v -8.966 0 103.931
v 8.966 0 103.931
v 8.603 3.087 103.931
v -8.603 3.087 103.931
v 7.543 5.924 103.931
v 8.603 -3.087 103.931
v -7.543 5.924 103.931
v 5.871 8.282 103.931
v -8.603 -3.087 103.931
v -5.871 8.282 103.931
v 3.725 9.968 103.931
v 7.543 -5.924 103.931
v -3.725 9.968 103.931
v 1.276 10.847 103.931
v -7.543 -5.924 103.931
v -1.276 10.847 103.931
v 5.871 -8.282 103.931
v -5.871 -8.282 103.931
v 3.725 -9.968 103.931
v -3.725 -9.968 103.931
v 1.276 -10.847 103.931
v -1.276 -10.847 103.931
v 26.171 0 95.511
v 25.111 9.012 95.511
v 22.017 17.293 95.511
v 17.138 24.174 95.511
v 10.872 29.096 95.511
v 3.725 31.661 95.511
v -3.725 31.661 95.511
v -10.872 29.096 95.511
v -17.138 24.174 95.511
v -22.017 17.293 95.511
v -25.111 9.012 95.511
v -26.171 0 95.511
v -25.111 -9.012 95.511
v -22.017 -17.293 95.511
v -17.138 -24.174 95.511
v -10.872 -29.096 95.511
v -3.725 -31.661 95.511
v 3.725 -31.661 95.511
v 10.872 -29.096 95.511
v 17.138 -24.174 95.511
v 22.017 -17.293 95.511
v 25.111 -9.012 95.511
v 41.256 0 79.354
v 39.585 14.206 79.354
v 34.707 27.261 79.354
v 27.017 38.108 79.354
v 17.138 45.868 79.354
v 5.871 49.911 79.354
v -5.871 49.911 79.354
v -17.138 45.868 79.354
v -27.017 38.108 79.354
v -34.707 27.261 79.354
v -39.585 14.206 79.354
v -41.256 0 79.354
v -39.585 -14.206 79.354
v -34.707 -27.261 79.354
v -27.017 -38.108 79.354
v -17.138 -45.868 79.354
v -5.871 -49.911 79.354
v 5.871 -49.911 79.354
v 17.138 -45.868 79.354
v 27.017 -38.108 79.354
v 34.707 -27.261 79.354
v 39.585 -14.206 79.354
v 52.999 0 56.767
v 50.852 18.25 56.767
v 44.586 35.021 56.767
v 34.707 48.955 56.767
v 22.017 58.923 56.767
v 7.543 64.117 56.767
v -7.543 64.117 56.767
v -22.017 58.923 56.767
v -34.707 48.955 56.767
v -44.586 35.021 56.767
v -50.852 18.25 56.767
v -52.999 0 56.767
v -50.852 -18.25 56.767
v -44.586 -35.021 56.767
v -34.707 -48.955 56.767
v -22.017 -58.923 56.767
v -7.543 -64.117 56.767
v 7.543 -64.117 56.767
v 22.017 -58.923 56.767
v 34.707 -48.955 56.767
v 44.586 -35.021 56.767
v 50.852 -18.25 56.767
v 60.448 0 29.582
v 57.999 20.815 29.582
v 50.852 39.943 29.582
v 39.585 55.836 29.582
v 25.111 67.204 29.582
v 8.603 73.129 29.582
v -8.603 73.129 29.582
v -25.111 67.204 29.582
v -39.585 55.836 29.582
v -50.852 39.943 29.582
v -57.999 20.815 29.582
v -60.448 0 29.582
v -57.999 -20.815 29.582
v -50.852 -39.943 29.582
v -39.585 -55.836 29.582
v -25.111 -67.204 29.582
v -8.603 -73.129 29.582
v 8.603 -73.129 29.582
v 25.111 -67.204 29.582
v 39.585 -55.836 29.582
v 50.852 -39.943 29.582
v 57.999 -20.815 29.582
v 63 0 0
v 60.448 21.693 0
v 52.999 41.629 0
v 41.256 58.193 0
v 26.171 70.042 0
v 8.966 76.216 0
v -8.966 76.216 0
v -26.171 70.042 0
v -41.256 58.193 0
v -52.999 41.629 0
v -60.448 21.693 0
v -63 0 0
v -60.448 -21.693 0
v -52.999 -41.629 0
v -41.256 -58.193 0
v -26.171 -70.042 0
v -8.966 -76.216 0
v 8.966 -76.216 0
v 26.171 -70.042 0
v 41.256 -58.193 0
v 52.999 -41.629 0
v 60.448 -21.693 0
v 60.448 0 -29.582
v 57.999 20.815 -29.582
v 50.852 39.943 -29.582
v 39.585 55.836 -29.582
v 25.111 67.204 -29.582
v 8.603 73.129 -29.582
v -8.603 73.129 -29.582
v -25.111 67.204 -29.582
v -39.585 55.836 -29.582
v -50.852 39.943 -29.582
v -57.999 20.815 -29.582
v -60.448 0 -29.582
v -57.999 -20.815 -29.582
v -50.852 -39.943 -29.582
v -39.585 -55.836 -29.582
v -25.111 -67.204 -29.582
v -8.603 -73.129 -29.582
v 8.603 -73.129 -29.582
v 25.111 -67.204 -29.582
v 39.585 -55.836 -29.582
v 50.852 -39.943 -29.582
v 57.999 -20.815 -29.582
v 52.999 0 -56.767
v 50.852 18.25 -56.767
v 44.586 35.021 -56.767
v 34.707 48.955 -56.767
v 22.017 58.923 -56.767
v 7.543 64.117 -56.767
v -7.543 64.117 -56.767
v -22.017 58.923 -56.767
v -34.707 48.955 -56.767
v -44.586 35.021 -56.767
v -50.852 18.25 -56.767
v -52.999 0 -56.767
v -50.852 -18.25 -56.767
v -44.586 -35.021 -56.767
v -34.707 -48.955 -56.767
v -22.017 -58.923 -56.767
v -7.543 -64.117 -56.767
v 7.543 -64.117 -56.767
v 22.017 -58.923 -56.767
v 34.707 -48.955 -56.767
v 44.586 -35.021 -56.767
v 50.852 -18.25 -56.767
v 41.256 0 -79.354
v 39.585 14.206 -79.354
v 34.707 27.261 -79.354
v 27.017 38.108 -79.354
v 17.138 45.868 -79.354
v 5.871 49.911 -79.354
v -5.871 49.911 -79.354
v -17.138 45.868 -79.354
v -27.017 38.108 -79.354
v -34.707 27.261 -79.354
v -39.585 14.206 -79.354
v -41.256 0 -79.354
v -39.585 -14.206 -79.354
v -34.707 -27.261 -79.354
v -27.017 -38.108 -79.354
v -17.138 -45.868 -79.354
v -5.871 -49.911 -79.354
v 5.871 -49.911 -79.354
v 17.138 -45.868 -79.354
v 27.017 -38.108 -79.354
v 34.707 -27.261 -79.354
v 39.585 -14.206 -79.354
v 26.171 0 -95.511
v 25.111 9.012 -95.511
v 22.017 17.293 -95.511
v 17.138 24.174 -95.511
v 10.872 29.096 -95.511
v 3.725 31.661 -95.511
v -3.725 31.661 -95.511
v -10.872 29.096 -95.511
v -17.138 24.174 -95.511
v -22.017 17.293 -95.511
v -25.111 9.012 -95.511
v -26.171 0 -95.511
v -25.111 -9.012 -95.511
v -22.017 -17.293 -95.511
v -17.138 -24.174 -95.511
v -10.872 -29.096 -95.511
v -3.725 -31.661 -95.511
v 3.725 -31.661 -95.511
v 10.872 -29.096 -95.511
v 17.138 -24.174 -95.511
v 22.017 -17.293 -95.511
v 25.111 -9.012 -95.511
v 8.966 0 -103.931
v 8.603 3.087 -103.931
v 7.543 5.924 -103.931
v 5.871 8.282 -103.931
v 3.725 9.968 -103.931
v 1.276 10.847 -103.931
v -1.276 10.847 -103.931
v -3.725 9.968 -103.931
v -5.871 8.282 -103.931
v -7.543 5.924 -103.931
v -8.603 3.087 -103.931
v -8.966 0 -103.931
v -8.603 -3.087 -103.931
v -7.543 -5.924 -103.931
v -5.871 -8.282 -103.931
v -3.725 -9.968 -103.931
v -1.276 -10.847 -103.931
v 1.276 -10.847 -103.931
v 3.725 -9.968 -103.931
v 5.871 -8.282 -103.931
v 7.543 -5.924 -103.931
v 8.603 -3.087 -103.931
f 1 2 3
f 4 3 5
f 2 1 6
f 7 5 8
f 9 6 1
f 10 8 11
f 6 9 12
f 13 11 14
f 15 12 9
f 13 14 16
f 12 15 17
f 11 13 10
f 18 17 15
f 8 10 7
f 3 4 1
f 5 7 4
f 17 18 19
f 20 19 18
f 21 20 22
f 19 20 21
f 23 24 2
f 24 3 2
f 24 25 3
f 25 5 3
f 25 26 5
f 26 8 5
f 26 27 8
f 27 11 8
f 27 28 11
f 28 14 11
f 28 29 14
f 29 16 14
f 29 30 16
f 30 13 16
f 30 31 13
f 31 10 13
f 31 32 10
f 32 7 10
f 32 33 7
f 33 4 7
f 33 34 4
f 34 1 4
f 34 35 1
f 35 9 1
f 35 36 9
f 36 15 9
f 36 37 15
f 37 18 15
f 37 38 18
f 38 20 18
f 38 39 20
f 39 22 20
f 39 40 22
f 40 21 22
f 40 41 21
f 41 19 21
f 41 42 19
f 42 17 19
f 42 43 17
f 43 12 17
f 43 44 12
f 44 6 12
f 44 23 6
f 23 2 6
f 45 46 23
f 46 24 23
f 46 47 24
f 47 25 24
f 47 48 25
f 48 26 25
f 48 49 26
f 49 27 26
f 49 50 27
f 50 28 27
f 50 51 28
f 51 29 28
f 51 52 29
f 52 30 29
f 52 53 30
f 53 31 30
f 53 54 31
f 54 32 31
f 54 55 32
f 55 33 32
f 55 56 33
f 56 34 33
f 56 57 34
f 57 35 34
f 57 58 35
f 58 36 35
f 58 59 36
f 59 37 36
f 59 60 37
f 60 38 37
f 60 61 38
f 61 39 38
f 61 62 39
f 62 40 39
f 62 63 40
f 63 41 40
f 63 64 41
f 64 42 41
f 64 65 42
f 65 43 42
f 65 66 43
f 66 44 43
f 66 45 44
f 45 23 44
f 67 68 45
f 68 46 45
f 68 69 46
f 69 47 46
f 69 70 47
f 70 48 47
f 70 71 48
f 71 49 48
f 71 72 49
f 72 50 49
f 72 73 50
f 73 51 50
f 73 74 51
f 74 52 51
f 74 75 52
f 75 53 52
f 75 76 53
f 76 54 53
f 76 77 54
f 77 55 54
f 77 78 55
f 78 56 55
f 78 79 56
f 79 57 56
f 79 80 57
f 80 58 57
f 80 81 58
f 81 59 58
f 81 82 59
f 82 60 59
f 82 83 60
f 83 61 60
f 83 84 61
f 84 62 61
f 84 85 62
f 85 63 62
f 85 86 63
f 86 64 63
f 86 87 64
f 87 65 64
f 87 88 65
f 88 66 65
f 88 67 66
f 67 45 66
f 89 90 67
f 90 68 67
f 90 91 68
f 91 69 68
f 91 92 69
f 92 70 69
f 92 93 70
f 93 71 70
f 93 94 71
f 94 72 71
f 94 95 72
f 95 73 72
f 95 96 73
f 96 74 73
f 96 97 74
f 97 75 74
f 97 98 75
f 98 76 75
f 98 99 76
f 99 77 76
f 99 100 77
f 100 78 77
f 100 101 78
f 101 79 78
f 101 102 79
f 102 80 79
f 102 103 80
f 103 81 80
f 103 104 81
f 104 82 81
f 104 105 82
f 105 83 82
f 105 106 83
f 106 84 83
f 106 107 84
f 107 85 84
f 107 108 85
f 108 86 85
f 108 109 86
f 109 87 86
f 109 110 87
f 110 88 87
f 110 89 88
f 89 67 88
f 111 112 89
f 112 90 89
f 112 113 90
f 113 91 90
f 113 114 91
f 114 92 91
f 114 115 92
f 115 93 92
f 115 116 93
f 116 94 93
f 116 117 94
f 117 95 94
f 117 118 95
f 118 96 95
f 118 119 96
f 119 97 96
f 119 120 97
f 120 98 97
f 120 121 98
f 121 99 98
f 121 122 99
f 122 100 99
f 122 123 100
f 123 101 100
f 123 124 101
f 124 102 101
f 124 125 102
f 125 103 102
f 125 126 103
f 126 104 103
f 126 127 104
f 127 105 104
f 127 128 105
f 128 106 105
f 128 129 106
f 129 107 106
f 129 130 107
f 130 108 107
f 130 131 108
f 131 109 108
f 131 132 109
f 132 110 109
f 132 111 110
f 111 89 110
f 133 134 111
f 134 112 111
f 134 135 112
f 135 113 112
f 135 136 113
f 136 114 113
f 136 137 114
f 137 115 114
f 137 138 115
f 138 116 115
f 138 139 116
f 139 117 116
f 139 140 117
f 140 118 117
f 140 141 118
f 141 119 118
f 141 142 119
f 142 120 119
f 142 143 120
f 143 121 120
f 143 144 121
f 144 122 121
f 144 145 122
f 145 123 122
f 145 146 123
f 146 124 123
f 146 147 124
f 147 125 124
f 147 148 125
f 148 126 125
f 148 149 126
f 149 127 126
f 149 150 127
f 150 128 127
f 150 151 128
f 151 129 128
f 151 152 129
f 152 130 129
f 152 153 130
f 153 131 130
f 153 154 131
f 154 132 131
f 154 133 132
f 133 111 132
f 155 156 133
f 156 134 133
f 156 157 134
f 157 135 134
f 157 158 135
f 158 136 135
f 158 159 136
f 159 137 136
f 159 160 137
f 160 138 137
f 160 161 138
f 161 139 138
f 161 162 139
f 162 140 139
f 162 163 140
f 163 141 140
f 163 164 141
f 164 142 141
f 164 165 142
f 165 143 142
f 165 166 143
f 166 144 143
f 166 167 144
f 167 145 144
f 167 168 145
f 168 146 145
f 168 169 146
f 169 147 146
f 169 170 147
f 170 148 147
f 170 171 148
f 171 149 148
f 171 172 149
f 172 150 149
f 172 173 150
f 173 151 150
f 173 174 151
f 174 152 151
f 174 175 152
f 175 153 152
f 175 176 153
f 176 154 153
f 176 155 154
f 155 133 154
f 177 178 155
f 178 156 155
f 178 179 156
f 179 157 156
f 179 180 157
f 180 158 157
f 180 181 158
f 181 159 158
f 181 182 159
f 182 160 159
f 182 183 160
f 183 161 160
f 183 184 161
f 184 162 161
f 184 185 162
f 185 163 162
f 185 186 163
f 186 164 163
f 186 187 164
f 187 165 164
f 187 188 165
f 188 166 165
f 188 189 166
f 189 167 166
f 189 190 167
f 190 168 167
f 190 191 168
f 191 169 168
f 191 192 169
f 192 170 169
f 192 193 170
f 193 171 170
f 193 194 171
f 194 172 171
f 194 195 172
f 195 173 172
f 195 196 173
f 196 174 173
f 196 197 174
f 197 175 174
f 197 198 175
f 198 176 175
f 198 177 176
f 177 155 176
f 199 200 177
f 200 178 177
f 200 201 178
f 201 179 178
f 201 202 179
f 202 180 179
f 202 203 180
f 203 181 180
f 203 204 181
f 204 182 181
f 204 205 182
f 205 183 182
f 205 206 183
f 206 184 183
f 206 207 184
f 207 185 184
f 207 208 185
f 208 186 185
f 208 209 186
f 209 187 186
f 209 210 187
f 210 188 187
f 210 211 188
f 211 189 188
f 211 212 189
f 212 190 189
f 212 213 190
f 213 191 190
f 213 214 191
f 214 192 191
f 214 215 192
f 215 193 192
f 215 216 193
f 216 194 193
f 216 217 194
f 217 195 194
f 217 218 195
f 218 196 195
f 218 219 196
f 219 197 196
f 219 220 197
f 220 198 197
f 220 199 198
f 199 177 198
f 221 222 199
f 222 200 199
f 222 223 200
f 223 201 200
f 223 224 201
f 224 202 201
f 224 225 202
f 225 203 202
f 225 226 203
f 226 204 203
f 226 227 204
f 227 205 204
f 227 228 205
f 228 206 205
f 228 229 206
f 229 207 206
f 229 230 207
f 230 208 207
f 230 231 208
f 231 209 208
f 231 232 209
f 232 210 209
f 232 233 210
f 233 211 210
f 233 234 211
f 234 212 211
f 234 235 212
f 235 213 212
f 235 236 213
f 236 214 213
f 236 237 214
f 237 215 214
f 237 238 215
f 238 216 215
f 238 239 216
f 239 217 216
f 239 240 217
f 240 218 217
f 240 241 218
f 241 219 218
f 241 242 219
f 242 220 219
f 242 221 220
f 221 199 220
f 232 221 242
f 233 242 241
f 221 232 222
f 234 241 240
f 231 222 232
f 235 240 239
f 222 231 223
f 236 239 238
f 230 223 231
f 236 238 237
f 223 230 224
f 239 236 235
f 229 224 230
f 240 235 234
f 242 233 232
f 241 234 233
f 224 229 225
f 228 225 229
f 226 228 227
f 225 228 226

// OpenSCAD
// Generated by SolidPython 1.0.1 on 2020-07-29 00:46:48


scale(v = [9, 11, 15]) {
	sphere(r = 7);
}
/***********************************************
*********      SolidPython code:      **********
************************************************
 
# import packages: SolidPython
from solid import *
from solid.utils import *
from itertools import chain, combinations, permutations


class Resize:

    def __init__(self, scad_file):
        self.scad_file = scad_file
        #self.scad_file = import_scad(scad_file)
        # cone/cylinder param:
        self.r1 = 0
        self.r2 = 0
        self.h = 0
        # rectangular prism param:
        self.w = 0
        self.l = 0
        # ellipse param:
        self.r = 0

    # import OpenScad code (file name corresponds to shape)


    # classify shape + parameters
    def assign(self, param1, param2, param3):
        if self.scad_file == 'cone.scad':
            self.r1 = param1
            self.r2 = param2
            self.h = param3
        elif self.scad_file == 'cylinder.scad':
            self.r1 = param1
            self.r2 = param2
            self.h = param3
        elif self.scad_file == 'rectangularPrism.scad':
            self.h = param1
            self.l = param2
            self.w = param3
        else:
            self.r = param1
            self.h = param2

    # resize parameters
    def iterate(self):
        x = range(3, 20, 2)
        i = 1
        if self.scad_file == 'cone.scad':
            tempList = list(permutations(x, 2))
            for temp in tempList:
                param1 = temp[0]
                param2 = temp[1]
                filepath = 'produced_scad_files/' + 'cone' + str(param1) + '_' + str(param2) + '_' + '.scad'
                scad_render_to_file(cylinder(h=param1, r1=param2, r2=0), filepath)

        elif self.scad_file == 'cylinder.scad':
            tempList = list(permutations(x, 3))
            for temp in tempList:
                param1 = temp[0]
                param2 = temp[1]
                filepath = 'produced_scad_files/' + 'cylinder' + str(param1) + '_' + str(param2) + '_' + '.scad'
                scad_render_to_file(cylinder(h=param1, r1=param2, r2=param2), filepath)

        elif self.scad_file == 'rectangularPrism.scad':
            tempList = list(permutations(x, 3))
            for temp in tempList:
                param1 = temp[0]
                param2 = temp[1]
                param3 = temp[2]
                filepath = 'produced_scad_files/' + 'rectangularPrism' + str(param1) + '_' + str(param2) + '_' + str(
                    param3) + '.scad'
                scad_render_to_file(cube(size=(param1, param2, param3)), filepath)

        elif self.scad_file == 'ellipse.scad':
            tempList = list(permutations(x, 4))
            for temp in tempList:
                param1 = temp[0]
                param2 = temp[1]
                param3 = temp[2]
                param4 = temp[3]
                filepath = 'produced_scad_files/' + 'ellipse' + str(param1) + '_' + str(param2) + '_' + str(param3) + '_' + str(param4) + '.scad'
                scad_render_to_file(scale([param1, param2, param3])(sphere(r=param4)), filepath)

    def render_to_scadfile(self):
        scad_render_to_file(scad, 'example.scad') 
 
************************************************/
